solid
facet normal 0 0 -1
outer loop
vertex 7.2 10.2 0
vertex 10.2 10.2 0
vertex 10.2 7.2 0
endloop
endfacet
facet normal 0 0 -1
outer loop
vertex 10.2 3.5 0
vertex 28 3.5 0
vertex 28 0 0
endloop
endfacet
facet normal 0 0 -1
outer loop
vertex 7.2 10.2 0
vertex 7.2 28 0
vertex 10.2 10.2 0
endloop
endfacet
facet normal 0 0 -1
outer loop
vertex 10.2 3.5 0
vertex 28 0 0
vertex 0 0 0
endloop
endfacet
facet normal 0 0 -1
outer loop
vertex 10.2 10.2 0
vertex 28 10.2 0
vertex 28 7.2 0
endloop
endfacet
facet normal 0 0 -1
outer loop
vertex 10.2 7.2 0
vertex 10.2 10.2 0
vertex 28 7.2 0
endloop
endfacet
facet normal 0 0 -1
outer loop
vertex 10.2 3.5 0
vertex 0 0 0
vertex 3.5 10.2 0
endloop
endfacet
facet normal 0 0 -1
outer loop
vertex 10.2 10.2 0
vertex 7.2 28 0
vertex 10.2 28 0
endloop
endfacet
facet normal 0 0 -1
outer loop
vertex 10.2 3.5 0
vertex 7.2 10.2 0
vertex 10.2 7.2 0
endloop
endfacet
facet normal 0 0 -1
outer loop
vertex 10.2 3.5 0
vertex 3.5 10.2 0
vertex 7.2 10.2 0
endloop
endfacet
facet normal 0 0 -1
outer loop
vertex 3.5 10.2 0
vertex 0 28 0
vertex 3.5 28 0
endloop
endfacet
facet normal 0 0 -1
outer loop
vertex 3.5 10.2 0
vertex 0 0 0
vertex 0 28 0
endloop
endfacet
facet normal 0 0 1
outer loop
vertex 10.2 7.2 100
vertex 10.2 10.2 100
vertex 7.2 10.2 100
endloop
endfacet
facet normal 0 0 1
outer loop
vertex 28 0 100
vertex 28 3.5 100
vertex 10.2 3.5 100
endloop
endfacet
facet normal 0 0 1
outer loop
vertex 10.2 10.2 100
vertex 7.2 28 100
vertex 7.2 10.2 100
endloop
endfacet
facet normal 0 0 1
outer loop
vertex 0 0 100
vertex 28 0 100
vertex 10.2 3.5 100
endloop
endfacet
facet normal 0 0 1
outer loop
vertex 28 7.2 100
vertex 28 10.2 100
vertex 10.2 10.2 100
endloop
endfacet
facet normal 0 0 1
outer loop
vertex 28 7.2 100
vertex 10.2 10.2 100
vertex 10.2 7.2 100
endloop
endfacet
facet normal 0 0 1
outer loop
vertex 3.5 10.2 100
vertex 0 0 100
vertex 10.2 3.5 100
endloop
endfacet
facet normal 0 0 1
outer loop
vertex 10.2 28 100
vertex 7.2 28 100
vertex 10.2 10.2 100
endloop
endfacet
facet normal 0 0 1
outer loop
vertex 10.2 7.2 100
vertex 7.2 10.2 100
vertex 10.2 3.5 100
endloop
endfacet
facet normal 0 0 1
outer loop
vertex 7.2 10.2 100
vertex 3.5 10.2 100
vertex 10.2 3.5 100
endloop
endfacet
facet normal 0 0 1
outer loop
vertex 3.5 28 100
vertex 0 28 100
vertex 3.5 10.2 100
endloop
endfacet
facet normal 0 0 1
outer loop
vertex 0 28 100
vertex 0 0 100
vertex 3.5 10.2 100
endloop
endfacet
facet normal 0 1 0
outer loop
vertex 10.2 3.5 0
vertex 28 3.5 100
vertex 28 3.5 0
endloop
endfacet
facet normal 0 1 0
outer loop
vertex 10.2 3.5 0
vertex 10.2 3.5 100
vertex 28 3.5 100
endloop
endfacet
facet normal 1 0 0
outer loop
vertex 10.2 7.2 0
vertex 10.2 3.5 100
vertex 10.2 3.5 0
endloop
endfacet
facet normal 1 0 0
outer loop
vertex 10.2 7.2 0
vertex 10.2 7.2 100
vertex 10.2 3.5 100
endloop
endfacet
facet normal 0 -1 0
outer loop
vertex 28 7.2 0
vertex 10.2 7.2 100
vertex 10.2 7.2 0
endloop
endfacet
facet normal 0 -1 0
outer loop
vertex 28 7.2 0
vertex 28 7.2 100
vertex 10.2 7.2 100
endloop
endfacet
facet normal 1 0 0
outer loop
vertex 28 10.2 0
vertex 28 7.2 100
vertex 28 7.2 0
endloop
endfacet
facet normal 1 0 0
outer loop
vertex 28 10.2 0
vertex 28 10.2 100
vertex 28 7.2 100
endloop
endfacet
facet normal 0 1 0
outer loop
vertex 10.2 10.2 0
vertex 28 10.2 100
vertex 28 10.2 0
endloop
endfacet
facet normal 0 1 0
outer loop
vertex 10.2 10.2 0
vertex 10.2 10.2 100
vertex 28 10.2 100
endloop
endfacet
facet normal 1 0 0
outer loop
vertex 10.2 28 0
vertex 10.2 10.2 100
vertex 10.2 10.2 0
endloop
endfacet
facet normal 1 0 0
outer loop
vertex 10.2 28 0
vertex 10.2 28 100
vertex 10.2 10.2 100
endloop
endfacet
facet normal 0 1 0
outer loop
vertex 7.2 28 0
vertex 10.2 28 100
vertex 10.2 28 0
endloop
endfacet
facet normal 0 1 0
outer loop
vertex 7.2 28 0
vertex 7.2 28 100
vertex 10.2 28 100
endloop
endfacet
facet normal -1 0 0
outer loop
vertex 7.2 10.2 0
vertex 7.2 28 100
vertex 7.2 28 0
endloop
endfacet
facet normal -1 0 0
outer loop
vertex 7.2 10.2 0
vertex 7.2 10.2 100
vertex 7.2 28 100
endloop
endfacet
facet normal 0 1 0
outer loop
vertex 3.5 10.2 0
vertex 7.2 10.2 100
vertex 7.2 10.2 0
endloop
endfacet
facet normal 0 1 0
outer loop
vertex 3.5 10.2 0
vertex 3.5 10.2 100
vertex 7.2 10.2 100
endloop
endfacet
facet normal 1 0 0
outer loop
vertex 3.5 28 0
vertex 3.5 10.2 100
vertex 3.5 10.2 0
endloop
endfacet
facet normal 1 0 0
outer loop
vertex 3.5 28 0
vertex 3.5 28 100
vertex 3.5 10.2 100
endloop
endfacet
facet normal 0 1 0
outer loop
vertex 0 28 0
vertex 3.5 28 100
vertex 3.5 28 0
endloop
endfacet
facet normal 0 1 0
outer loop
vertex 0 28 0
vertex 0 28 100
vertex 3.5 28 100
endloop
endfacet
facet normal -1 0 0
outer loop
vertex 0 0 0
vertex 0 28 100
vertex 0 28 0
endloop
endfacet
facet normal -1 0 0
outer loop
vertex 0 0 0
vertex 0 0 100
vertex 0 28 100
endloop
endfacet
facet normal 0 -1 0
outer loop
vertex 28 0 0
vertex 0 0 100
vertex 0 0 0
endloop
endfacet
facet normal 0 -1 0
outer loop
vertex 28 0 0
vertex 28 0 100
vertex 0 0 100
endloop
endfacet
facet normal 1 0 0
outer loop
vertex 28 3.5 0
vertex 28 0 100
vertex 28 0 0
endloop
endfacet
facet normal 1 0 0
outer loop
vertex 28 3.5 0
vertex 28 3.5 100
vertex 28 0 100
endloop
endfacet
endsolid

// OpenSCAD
// file: common.scad
// common.scad — shared parameters for the aquarium grow-box parts.
// Everything downstream is driven from here. Measure YOUR tank, fan and lid
// with calipers and edit this file; do not trust the defaults.

$fn = 96;

/* ---------------- measured inputs ---------------- */
glass_t  = 6;      // tank wall glass thickness. 20-long / 29 gal is usually 5-6 mm.
rim_w    = 14;     // width of the plastic top trim, front to back
rim_h    = 16;     // height of the plastic top trim
lid_t    = 3;      // chamber lid sheet thickness. 3 mm polycarbonate default.
panel_t  = 3;      // chamber wall sheet thickness
deck_t   = 18;     // deck sheet thickness: the tank's cap and the chamber's floor
duct_nom = 101.6;  // 4 in duct. Use 152.4 for a 6 in fan.
probe_d  = 10;     // sensor-probe body diameter
cable_d  = 6;      // fattest cable that must pass through the lid

/* ---------------- print fit ---------------- */
slop = 0.35;  // clearance per side on sliding fits
wall = 3;     // default wall thickness
eps  = 0.01;  // z-fighting guard

/* ---------------- helpers ---------------- */

// A ring of clearance holes, drilled from z=0 upward.
module bolt_ring(count, radius, hole_d, depth) {
    for (i = [0 : count - 1])
        rotate([0, 0, i * 360 / count])
            translate([radius, 0, -eps])
                cylinder(d = hole_d, h = depth + 2 * eps);
}

// Rounded rectangular plate centred on the origin, sitting on z=0.
module rounded_plate(x, y, z, r = 4) {
    hull()
        for (dx = [-1, 1], dy = [-1, 1])
            translate([dx * (x / 2 - r), dy * (y / 2 - r), 0])
                cylinder(r = r, h = z);
}

// Four corner clearance holes inset from the edges of an x by y plate.
module corner_holes(x, y, inset, hole_d, depth) {
    for (dx = [-1, 1], dy = [-1, 1])
        translate([dx * (x / 2 - inset), dy * (y / 2 - inset), -eps])
            cylinder(d = hole_d, h = depth + 2 * eps);
}

// Upside-down U that straddles the tank's top trim. Opening faces -z, length
// runs along x. -y is the tank interior, +y is the outside.
// `outer_foot` extends the outer wall down the outside glass: that is what
// stops a hanging load from levering the part off the rim. Put a strip of EVA
// foam between the foot and the glass.
// Print with the opening facing up, no supports.
module rim_saddle(len = 40, jaw = rim_w, depth = rim_h * 0.8, t = wall,
                  outer_foot = 0) {
    union() {
        difference() {
            translate([-len / 2, -(jaw / 2 + t), 0])
                cube([len, jaw + 2 * t, depth + t]);
            translate([-len / 2 - eps, -(jaw / 2 + slop), -eps])
                cube([len + 2 * eps, jaw + 2 * slop, depth + eps]);
        }
        if (outer_foot > 0)
            translate([-len / 2, jaw / 2 + slop, -outer_foot])
                cube([len, t - slop, outer_foot + eps]);
    }
}

// Height of the top face of a default rim_saddle.
saddle_top = rim_h * 0.8 + wall;

// Right-triangle brace: base `len` along +x, `height` along +z, `thick` in -y.
module gusset(len, height, thick) {
    rotate([90, 0, 0])
        linear_extrude(height = thick)
            polygon([[0, 0], [len, 0], [0, height]]);
}
// main file
// chamber_corner.scad — the grow chamber is four sheets standing on the deck.
// These are its corners: a 90-degree extrusion with a groove down each wing
// that a panel slides into. Stack `spline` segments up the height of the box
// and use `foot` at the bottom, where it screws down to the deck.
//
// There are deliberately no alignment pins between segments: once the panels
// are in their grooves the panels themselves are the alignment, the foot
// carries the stack, and a lid_rail_clip (jaw set to panel_t) caps it.
//
// Print standing up, as modelled. part = "spline" or "foot".

include <common.scad>

part    = "spline";
seg_h   = 100;                    // segment height; stack as many as you need
leg     = 28;                     // how far each wing reaches along a wall
slot_w  = panel_t + 2 * slop;
back    = 3.5;                    // material outboard of the panel
inner   = 3;                      // material inboard of the panel
foot_h  = 35;
base_x  = 52;                     // foot base plate, square
base_t  = 5;
screw_d = 4.4;                    // M4 clearance into the deck

t_total = back + slot_w + inner;

module corner_profile() {
    difference() {
        union() {
            square([leg, t_total]);
            square([t_total, leg]);
        }
        // grooves, open at each wing tip so a panel slides in from the end
        translate([t_total, back])
            square([leg - t_total + eps, slot_w]);
        translate([back, t_total])
            square([slot_w, leg - t_total + eps]);
    }
}

module spline(h = seg_h) {
    linear_extrude(height = h) corner_profile();
}

module foot() {
    difference() {
        union() {
            translate([0, 0, base_t - eps]) spline(h = foot_h);
            translate([base_x / 2 - 4, base_x / 2 - 4, 0])
                rounded_plate(base_x, base_x, base_t, 4);
        }
        // Screws land inboard on the bare plate, clear of both panel grooves
        // (panels occupy y 3.5-7.1 and x 3.5-7.1), so a driver can reach them
        // before the sheets slide in.
        for (pt = [[38, 14], [14, 38]])
            translate([pt[0], pt[1], -eps])
                cylinder(d = screw_d, h = base_t + 2 * eps);
    }
}

if (part == "foot") foot(); else spline();
